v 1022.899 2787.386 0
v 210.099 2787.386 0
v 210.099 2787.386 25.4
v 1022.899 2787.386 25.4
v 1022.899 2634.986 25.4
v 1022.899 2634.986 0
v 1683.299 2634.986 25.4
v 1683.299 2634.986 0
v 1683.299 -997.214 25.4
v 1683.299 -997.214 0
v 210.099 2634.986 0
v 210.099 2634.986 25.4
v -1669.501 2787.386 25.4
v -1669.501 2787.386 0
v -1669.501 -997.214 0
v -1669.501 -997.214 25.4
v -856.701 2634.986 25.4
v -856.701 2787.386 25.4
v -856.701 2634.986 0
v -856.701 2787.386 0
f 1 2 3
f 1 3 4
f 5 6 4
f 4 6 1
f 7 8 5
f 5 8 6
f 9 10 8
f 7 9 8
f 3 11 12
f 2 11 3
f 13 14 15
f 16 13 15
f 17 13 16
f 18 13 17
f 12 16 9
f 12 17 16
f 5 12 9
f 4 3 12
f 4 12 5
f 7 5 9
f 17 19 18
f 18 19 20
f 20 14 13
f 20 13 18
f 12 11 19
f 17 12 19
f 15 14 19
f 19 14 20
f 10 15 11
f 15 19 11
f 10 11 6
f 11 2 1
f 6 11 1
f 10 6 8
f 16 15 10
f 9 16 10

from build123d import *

# Parameters (mm, degrees)
F0_W     = 812.8
F0_H     = 152.4
F1_DEPTH = 25.4


with BuildPart() as f1:
    # F0 (on Top) → F1 (new body)
    with BuildSketch(Plane.XY):
        Polygon((-856.700591, 2634.985886), (-1669.500591, 2634.985886), (-1669.500591, -997.214114), (1683.299409, -997.214114), (1683.299409, 2634.985886), (1022.899409, 2634.985886), (210.099409, 2634.985886), align=None)
        with Locations((-1263.100591, 2711.185886)):
            Rectangle(F0_W, F0_H)
        with Locations((616.499409, 2711.185886)):
            Rectangle(F0_W, F0_H)
    extrude(amount=F1_DEPTH)


solid = f1.part
